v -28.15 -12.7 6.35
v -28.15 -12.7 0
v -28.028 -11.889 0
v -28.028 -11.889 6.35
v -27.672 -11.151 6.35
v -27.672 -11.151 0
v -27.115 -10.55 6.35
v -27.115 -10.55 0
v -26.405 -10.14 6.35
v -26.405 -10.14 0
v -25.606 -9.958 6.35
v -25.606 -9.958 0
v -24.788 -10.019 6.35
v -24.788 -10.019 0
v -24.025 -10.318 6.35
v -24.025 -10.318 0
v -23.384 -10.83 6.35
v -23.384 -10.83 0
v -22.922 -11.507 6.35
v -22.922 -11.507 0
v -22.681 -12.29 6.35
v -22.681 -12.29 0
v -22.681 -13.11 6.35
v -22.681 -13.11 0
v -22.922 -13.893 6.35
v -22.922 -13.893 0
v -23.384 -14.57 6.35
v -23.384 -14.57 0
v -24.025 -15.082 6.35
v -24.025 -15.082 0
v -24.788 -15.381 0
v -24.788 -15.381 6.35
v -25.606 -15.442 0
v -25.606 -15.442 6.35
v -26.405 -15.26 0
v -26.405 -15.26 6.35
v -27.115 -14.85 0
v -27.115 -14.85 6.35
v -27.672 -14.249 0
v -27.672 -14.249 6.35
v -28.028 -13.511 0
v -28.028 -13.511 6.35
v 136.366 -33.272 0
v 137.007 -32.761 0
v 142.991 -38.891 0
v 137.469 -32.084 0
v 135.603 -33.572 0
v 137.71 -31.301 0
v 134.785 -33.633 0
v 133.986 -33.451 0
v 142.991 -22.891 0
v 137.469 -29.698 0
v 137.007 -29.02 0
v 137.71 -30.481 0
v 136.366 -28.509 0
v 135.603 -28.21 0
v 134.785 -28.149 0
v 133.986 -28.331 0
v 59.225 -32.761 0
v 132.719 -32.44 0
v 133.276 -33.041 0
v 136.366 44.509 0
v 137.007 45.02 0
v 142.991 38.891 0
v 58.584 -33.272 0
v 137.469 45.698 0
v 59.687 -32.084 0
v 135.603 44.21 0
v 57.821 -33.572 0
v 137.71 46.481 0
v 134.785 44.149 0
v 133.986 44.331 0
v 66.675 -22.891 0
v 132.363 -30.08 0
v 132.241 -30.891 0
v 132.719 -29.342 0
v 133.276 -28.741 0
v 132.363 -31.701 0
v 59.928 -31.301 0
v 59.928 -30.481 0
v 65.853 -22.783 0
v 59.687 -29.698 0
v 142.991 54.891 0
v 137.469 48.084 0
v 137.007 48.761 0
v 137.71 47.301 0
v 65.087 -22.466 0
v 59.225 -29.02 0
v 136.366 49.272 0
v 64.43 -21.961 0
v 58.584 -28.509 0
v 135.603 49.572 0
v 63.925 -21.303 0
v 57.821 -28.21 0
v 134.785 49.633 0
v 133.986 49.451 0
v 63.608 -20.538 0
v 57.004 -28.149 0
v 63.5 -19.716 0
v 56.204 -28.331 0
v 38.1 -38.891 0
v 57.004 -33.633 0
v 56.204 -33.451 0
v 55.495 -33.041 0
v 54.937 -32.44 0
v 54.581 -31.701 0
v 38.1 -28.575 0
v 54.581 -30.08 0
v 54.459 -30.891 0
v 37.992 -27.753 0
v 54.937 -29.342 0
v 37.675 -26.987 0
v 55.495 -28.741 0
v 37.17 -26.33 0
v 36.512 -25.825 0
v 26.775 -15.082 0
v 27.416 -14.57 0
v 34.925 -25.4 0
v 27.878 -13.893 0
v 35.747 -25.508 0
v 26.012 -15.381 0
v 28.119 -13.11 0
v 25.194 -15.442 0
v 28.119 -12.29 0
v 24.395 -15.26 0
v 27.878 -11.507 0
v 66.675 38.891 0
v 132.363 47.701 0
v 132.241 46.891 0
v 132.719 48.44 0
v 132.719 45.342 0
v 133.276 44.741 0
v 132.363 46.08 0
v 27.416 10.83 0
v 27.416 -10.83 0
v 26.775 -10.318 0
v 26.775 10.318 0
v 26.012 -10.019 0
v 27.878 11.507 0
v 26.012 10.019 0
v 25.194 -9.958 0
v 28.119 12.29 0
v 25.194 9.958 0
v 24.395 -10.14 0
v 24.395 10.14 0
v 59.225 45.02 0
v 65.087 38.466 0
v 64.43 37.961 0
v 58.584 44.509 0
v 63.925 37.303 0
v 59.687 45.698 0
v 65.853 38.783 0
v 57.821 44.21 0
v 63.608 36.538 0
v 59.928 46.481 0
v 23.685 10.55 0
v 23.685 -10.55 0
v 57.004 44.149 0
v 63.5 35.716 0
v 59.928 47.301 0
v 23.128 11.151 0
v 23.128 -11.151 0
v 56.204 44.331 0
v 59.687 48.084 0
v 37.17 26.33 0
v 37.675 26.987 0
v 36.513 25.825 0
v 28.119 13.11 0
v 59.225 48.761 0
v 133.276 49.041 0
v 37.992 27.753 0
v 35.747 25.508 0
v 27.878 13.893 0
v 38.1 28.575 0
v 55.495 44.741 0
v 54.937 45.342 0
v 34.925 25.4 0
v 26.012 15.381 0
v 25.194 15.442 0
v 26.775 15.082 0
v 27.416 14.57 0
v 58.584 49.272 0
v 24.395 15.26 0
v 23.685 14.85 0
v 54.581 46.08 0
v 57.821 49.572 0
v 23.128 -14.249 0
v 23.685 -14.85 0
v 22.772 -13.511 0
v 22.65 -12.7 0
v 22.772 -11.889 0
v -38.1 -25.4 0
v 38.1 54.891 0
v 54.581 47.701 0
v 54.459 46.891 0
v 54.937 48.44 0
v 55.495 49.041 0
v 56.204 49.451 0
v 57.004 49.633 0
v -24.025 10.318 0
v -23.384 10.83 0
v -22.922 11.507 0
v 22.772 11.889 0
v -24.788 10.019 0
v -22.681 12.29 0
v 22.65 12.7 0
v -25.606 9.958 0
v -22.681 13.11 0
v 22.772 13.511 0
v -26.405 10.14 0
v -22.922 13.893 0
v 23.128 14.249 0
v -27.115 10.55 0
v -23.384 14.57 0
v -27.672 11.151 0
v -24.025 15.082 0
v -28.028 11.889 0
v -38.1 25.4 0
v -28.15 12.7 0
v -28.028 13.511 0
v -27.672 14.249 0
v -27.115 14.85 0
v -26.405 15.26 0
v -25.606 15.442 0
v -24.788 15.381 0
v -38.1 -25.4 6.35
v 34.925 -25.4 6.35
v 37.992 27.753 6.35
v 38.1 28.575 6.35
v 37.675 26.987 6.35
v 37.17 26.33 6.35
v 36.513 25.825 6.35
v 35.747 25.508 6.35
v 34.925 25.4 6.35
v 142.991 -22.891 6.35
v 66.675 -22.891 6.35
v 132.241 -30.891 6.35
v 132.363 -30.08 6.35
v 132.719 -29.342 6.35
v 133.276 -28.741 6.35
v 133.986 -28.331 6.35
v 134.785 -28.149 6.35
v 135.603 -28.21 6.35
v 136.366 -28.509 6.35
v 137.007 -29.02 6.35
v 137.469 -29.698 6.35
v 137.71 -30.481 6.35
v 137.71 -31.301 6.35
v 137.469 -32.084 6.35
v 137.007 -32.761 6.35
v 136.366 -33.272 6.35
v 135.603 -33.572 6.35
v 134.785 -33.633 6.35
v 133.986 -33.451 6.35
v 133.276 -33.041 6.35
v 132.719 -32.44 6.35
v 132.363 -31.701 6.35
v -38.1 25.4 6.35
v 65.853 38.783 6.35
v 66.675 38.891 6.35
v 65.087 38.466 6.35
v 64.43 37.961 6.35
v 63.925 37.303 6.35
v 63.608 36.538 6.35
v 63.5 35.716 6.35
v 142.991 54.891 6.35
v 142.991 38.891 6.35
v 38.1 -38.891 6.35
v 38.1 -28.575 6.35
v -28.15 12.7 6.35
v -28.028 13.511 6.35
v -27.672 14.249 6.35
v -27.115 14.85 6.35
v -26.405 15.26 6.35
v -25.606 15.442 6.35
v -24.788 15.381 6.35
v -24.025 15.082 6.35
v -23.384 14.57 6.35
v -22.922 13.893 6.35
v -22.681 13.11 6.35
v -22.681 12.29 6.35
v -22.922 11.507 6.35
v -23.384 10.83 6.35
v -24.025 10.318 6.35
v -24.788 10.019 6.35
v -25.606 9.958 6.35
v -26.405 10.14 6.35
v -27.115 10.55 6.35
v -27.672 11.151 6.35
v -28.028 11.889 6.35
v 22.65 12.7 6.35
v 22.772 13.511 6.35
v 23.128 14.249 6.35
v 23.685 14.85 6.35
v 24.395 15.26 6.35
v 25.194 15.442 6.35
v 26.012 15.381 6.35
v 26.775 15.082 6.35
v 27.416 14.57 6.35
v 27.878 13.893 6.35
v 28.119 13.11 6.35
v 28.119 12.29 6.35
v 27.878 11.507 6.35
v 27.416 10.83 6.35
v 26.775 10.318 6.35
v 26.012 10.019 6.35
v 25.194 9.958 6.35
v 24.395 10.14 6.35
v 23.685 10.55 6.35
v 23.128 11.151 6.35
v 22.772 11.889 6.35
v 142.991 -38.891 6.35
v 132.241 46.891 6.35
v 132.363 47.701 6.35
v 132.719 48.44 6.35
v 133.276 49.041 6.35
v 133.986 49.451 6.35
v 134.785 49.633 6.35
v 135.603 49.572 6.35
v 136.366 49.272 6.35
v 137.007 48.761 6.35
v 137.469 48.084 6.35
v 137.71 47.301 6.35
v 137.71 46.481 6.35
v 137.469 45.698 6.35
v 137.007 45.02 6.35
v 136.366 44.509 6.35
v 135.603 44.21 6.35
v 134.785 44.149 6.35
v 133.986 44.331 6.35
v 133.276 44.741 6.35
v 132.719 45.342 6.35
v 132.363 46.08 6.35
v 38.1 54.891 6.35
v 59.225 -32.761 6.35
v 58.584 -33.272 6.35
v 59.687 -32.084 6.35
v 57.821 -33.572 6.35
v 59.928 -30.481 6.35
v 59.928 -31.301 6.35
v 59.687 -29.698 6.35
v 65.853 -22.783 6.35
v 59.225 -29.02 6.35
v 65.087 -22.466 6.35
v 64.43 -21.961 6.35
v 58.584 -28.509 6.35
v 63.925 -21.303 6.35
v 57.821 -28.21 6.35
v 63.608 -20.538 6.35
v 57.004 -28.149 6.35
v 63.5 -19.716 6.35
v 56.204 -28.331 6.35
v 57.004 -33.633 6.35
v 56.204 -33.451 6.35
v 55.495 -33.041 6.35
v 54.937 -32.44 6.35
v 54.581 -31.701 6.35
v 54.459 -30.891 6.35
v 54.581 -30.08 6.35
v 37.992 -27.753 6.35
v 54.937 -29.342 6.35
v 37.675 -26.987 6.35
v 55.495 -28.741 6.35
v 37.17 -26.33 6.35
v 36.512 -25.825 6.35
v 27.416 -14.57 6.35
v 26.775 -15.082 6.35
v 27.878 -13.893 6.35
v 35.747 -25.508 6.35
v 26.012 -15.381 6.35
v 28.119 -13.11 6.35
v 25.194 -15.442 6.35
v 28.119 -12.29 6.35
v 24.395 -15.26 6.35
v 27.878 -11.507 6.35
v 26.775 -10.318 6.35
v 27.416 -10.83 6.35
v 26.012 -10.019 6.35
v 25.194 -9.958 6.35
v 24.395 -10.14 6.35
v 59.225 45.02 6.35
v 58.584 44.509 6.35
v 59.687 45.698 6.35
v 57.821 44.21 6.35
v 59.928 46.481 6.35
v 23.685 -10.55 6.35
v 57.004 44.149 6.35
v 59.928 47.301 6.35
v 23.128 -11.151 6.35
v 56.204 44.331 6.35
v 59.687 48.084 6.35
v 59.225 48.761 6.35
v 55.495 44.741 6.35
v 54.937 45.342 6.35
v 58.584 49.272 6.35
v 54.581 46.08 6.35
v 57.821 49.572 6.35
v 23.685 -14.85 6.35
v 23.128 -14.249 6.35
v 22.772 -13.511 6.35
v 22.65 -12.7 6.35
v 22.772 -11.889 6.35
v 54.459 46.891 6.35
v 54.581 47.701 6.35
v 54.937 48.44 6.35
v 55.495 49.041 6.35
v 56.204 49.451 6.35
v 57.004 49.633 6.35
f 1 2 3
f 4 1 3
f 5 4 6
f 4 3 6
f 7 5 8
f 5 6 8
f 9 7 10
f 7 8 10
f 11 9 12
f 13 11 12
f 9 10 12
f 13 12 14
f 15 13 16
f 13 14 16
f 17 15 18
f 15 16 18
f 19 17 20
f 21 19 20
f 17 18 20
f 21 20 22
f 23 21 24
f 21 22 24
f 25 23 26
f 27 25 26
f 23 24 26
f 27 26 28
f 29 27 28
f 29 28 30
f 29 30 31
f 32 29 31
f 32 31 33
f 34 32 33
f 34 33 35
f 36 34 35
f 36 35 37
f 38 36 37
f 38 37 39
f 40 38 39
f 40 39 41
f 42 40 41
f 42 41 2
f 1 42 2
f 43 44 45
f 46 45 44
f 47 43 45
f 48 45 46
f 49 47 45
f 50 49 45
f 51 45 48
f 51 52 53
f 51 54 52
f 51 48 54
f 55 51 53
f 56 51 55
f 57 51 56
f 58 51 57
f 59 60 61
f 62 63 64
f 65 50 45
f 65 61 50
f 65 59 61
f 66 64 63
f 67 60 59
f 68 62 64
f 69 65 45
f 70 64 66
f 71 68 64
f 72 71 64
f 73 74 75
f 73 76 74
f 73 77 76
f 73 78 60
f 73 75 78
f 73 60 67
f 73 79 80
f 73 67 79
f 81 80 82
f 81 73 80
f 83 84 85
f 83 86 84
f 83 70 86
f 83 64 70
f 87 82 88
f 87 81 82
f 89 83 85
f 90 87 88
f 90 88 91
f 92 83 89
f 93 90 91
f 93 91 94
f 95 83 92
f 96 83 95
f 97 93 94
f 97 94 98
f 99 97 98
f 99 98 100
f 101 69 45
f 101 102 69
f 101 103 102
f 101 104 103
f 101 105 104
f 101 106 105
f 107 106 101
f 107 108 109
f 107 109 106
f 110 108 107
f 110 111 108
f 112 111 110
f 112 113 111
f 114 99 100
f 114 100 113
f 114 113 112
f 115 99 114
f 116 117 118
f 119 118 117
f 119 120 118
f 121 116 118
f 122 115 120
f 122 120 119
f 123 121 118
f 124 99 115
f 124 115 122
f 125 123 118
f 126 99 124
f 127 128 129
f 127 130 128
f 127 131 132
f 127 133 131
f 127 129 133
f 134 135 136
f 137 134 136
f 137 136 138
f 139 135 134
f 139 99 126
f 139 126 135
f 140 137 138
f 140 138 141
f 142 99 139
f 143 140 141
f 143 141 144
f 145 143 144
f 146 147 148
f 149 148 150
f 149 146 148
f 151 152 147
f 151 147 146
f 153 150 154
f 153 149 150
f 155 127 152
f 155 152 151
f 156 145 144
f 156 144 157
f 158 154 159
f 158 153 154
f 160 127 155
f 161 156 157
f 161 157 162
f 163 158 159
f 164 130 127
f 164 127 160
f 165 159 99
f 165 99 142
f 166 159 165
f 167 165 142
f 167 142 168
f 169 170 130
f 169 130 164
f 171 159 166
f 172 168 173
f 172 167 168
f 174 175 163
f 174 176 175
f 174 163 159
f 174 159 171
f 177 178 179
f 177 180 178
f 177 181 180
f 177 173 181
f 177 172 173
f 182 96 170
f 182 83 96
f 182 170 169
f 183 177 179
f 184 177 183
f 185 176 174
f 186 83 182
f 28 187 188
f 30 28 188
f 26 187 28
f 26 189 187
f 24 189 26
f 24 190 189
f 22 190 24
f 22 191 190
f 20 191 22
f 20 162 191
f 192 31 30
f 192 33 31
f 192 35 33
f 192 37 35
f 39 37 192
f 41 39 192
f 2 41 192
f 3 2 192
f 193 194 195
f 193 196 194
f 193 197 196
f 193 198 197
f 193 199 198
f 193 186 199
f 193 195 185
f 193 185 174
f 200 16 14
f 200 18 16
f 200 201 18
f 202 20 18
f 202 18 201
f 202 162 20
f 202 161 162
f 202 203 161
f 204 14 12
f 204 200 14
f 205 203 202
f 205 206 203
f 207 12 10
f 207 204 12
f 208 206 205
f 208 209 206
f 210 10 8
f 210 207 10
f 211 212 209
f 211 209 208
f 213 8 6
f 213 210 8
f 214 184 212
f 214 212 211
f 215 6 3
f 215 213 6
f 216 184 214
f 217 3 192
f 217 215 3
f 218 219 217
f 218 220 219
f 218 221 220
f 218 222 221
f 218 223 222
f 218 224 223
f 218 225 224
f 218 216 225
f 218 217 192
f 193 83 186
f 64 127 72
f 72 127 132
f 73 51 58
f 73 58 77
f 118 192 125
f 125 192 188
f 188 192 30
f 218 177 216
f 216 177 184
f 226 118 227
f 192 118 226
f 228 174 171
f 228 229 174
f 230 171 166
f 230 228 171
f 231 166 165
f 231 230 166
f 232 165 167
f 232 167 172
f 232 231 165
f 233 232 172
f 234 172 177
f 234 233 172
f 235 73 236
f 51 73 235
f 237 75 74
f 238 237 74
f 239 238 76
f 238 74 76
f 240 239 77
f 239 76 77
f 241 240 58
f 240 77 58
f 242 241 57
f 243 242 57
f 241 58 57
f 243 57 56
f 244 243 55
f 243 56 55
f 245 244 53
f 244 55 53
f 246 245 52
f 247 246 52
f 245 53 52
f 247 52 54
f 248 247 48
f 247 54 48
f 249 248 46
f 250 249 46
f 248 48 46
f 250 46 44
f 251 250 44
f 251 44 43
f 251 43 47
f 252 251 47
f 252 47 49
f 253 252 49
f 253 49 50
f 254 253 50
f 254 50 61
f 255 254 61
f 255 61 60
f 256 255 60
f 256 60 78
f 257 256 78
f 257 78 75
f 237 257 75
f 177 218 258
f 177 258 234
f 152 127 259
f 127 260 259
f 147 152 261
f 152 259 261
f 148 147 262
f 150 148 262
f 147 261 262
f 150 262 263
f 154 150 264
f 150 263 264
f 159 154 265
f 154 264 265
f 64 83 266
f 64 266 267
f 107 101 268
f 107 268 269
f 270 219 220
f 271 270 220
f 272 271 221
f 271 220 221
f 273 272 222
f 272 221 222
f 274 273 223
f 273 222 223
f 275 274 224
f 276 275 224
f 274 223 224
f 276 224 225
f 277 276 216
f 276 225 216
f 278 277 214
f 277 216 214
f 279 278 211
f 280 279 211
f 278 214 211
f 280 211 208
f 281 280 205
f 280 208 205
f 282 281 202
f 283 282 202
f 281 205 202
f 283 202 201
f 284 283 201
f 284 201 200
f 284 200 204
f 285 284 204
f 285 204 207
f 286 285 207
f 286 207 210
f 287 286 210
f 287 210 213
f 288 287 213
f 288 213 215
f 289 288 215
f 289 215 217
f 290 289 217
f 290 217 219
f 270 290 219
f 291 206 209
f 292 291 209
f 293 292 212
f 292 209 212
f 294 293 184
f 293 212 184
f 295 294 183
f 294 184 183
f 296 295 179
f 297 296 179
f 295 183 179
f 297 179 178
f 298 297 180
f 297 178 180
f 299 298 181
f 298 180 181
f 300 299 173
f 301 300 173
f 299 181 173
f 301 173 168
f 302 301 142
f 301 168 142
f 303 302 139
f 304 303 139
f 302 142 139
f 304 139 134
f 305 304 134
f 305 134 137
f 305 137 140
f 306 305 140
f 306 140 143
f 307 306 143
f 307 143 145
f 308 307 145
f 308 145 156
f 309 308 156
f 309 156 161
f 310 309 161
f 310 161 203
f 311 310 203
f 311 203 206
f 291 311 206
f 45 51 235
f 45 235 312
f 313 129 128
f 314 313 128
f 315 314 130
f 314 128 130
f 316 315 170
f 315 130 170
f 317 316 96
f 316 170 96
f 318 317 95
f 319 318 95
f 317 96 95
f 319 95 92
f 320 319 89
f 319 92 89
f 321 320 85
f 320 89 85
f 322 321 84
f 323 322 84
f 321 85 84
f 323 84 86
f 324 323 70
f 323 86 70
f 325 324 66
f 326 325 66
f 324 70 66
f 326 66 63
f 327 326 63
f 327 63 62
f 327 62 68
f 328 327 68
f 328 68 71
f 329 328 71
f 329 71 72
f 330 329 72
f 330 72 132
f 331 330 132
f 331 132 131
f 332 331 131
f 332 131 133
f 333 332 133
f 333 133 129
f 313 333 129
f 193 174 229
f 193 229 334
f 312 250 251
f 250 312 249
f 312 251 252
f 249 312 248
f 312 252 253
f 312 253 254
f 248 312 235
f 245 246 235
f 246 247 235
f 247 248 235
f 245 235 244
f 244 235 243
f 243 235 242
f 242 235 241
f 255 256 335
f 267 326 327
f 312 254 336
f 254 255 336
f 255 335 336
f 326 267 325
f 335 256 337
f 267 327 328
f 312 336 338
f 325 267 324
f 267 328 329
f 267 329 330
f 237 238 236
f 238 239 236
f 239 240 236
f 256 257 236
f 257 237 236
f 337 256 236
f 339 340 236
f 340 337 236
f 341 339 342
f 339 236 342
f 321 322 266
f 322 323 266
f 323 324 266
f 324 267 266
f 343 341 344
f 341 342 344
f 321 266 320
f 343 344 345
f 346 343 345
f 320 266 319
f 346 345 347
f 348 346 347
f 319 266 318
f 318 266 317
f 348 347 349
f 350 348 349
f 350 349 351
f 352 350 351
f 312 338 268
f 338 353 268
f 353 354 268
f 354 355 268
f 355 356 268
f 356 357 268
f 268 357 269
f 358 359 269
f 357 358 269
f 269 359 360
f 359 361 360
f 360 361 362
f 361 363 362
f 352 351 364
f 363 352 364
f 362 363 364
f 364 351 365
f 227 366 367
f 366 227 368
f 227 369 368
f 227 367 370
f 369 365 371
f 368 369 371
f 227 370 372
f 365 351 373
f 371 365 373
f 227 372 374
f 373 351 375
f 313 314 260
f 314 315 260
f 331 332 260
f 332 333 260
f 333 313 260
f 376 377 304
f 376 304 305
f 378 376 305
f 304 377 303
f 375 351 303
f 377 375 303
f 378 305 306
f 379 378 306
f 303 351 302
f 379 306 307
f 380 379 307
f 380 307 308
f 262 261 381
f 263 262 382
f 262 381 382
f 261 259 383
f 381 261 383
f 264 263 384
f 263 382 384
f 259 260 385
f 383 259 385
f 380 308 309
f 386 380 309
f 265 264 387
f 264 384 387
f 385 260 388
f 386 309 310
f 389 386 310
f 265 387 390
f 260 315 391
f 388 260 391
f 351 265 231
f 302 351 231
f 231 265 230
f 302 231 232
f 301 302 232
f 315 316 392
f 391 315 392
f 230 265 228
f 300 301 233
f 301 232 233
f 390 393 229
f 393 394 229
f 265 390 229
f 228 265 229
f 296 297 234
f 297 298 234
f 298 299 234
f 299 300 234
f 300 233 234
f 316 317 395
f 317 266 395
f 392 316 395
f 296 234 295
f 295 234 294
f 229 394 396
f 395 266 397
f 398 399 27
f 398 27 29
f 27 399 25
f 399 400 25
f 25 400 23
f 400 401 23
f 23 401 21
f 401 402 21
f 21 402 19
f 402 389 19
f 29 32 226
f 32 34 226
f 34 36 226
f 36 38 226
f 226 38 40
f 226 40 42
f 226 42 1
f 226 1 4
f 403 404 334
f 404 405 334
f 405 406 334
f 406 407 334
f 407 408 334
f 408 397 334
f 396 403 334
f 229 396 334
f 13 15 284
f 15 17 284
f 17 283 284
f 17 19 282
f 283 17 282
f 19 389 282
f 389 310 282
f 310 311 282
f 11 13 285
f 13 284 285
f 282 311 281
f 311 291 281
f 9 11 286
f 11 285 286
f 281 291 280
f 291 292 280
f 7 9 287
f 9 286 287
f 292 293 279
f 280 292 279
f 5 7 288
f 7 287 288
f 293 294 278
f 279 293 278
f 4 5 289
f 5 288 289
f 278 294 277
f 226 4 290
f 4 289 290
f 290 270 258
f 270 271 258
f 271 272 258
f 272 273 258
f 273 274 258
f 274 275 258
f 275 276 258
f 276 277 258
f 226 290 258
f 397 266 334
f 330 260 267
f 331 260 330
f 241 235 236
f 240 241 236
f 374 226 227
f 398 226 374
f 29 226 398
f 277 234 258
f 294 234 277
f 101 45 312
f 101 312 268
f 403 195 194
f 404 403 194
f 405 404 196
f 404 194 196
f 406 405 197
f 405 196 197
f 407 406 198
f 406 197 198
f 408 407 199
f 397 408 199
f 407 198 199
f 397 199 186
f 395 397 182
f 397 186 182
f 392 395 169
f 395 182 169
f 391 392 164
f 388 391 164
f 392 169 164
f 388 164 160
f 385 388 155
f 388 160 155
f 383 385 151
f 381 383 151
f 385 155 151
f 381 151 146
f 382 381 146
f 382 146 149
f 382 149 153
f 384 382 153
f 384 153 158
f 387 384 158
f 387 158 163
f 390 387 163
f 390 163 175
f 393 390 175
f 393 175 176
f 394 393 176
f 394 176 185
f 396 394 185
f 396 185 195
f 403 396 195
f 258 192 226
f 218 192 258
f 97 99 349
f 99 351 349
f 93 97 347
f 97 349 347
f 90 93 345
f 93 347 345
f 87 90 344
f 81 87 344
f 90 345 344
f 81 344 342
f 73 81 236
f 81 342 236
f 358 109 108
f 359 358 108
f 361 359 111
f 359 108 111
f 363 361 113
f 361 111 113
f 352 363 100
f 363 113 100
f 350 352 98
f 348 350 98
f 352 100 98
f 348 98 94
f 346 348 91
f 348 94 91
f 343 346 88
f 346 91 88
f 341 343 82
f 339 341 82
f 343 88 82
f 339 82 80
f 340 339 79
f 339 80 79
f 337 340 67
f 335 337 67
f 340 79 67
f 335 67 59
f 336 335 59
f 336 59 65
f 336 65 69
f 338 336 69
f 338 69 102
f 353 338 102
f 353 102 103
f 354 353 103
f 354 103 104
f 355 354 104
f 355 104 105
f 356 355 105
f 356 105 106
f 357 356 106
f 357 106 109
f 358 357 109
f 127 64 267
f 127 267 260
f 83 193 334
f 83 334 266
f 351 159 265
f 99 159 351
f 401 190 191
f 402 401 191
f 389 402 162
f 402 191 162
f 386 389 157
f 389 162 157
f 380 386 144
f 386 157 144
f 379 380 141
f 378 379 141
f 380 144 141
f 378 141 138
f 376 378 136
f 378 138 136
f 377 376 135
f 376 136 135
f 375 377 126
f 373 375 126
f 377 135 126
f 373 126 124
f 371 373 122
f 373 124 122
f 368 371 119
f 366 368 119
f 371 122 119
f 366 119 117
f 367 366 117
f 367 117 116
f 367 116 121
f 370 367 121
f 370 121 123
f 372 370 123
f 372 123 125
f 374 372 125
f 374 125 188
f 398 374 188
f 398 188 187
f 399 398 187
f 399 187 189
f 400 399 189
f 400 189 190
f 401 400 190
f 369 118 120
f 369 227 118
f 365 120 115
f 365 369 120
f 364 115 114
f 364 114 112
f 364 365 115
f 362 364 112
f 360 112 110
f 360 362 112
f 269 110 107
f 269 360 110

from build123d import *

# Parameters (mm, degrees)
BOSS_EXTRUDE1_DEPTH      = 6.35
M5_CLEARANCE_HOLE1_D     = 5.5
M5_CLEARANCE_HOLE1_DEPTH = 18.75
M5_CLEARANCE_HOLE1_TIP   = 1.652366702
FILLET1_R                = 3.175
M5_CLEARANCE_HOLE2_D     = 5.5
M5_CLEARANCE_HOLE2_DEPTH = 18.75
M5_CLEARANCE_HOLE2_TIP   = 1.652366702


with BuildPart() as part:
    # Sketch1 → Boss-Extrude1 (new body)
    with BuildSketch(Plane.XY):
        Polygon((38.1, 25.4), (38.1, 54.890872965), (142.990872965, 54.890872965), (142.990872965, 38.890872965), (63.5, 38.890872965), (63.5, -22.890872965), (142.990872965, -22.890872965), (142.990872965, -38.890872965), (38.1, -38.890872965), (38.1, -25.4), (-38.1, -25.4), (-38.1, 25.4), align=None)
    extrude(amount=BOSS_EXTRUDE1_DEPTH)

    # M5 Clearance Hole1
    with Locations(Plane.XY.offset(6.35)):
        with Locations((134.990872965, 46.890872965), (134.990872965, -30.890872965), (57.209127035, 46.890872965), (57.209127035, -30.890872965)):
            Hole(M5_CLEARANCE_HOLE1_D / 2, depth=M5_CLEARANCE_HOLE1_DEPTH)
            with Locations((0, 0, -(M5_CLEARANCE_HOLE1_DEPTH + M5_CLEARANCE_HOLE1_TIP / 2))):  # 118° drill point
                Cone(0, M5_CLEARANCE_HOLE1_D / 2, M5_CLEARANCE_HOLE1_TIP, mode=Mode.SUBTRACT)

    # Fillet1
    fillet1_edges = [part.edges().sort_by_distance(p)[0] for p in [
        (38.1, 25.4, 3.175),
        (63.5, 38.890872965, 3.175),
        (63.5, -22.890872965, 3.175),
        (38.1, -25.4, 3.175),
    ]]
    fillet(fillet1_edges, radius=FILLET1_R)

    # M5 Clearance Hole2
    with Locations(Plane.XY.offset(6.35)):
        with Locations((-25.4, 12.7), (25.4, 12.7), (25.4, -12.7), (-25.4, -12.7)):
            Hole(M5_CLEARANCE_HOLE2_D / 2, depth=M5_CLEARANCE_HOLE2_DEPTH)
            with Locations((0, 0, -(M5_CLEARANCE_HOLE2_DEPTH + M5_CLEARANCE_HOLE2_TIP / 2))):  # 118° drill point
                Cone(0, M5_CLEARANCE_HOLE2_D / 2, M5_CLEARANCE_HOLE2_TIP, mode=Mode.SUBTRACT)


solid = part.part
